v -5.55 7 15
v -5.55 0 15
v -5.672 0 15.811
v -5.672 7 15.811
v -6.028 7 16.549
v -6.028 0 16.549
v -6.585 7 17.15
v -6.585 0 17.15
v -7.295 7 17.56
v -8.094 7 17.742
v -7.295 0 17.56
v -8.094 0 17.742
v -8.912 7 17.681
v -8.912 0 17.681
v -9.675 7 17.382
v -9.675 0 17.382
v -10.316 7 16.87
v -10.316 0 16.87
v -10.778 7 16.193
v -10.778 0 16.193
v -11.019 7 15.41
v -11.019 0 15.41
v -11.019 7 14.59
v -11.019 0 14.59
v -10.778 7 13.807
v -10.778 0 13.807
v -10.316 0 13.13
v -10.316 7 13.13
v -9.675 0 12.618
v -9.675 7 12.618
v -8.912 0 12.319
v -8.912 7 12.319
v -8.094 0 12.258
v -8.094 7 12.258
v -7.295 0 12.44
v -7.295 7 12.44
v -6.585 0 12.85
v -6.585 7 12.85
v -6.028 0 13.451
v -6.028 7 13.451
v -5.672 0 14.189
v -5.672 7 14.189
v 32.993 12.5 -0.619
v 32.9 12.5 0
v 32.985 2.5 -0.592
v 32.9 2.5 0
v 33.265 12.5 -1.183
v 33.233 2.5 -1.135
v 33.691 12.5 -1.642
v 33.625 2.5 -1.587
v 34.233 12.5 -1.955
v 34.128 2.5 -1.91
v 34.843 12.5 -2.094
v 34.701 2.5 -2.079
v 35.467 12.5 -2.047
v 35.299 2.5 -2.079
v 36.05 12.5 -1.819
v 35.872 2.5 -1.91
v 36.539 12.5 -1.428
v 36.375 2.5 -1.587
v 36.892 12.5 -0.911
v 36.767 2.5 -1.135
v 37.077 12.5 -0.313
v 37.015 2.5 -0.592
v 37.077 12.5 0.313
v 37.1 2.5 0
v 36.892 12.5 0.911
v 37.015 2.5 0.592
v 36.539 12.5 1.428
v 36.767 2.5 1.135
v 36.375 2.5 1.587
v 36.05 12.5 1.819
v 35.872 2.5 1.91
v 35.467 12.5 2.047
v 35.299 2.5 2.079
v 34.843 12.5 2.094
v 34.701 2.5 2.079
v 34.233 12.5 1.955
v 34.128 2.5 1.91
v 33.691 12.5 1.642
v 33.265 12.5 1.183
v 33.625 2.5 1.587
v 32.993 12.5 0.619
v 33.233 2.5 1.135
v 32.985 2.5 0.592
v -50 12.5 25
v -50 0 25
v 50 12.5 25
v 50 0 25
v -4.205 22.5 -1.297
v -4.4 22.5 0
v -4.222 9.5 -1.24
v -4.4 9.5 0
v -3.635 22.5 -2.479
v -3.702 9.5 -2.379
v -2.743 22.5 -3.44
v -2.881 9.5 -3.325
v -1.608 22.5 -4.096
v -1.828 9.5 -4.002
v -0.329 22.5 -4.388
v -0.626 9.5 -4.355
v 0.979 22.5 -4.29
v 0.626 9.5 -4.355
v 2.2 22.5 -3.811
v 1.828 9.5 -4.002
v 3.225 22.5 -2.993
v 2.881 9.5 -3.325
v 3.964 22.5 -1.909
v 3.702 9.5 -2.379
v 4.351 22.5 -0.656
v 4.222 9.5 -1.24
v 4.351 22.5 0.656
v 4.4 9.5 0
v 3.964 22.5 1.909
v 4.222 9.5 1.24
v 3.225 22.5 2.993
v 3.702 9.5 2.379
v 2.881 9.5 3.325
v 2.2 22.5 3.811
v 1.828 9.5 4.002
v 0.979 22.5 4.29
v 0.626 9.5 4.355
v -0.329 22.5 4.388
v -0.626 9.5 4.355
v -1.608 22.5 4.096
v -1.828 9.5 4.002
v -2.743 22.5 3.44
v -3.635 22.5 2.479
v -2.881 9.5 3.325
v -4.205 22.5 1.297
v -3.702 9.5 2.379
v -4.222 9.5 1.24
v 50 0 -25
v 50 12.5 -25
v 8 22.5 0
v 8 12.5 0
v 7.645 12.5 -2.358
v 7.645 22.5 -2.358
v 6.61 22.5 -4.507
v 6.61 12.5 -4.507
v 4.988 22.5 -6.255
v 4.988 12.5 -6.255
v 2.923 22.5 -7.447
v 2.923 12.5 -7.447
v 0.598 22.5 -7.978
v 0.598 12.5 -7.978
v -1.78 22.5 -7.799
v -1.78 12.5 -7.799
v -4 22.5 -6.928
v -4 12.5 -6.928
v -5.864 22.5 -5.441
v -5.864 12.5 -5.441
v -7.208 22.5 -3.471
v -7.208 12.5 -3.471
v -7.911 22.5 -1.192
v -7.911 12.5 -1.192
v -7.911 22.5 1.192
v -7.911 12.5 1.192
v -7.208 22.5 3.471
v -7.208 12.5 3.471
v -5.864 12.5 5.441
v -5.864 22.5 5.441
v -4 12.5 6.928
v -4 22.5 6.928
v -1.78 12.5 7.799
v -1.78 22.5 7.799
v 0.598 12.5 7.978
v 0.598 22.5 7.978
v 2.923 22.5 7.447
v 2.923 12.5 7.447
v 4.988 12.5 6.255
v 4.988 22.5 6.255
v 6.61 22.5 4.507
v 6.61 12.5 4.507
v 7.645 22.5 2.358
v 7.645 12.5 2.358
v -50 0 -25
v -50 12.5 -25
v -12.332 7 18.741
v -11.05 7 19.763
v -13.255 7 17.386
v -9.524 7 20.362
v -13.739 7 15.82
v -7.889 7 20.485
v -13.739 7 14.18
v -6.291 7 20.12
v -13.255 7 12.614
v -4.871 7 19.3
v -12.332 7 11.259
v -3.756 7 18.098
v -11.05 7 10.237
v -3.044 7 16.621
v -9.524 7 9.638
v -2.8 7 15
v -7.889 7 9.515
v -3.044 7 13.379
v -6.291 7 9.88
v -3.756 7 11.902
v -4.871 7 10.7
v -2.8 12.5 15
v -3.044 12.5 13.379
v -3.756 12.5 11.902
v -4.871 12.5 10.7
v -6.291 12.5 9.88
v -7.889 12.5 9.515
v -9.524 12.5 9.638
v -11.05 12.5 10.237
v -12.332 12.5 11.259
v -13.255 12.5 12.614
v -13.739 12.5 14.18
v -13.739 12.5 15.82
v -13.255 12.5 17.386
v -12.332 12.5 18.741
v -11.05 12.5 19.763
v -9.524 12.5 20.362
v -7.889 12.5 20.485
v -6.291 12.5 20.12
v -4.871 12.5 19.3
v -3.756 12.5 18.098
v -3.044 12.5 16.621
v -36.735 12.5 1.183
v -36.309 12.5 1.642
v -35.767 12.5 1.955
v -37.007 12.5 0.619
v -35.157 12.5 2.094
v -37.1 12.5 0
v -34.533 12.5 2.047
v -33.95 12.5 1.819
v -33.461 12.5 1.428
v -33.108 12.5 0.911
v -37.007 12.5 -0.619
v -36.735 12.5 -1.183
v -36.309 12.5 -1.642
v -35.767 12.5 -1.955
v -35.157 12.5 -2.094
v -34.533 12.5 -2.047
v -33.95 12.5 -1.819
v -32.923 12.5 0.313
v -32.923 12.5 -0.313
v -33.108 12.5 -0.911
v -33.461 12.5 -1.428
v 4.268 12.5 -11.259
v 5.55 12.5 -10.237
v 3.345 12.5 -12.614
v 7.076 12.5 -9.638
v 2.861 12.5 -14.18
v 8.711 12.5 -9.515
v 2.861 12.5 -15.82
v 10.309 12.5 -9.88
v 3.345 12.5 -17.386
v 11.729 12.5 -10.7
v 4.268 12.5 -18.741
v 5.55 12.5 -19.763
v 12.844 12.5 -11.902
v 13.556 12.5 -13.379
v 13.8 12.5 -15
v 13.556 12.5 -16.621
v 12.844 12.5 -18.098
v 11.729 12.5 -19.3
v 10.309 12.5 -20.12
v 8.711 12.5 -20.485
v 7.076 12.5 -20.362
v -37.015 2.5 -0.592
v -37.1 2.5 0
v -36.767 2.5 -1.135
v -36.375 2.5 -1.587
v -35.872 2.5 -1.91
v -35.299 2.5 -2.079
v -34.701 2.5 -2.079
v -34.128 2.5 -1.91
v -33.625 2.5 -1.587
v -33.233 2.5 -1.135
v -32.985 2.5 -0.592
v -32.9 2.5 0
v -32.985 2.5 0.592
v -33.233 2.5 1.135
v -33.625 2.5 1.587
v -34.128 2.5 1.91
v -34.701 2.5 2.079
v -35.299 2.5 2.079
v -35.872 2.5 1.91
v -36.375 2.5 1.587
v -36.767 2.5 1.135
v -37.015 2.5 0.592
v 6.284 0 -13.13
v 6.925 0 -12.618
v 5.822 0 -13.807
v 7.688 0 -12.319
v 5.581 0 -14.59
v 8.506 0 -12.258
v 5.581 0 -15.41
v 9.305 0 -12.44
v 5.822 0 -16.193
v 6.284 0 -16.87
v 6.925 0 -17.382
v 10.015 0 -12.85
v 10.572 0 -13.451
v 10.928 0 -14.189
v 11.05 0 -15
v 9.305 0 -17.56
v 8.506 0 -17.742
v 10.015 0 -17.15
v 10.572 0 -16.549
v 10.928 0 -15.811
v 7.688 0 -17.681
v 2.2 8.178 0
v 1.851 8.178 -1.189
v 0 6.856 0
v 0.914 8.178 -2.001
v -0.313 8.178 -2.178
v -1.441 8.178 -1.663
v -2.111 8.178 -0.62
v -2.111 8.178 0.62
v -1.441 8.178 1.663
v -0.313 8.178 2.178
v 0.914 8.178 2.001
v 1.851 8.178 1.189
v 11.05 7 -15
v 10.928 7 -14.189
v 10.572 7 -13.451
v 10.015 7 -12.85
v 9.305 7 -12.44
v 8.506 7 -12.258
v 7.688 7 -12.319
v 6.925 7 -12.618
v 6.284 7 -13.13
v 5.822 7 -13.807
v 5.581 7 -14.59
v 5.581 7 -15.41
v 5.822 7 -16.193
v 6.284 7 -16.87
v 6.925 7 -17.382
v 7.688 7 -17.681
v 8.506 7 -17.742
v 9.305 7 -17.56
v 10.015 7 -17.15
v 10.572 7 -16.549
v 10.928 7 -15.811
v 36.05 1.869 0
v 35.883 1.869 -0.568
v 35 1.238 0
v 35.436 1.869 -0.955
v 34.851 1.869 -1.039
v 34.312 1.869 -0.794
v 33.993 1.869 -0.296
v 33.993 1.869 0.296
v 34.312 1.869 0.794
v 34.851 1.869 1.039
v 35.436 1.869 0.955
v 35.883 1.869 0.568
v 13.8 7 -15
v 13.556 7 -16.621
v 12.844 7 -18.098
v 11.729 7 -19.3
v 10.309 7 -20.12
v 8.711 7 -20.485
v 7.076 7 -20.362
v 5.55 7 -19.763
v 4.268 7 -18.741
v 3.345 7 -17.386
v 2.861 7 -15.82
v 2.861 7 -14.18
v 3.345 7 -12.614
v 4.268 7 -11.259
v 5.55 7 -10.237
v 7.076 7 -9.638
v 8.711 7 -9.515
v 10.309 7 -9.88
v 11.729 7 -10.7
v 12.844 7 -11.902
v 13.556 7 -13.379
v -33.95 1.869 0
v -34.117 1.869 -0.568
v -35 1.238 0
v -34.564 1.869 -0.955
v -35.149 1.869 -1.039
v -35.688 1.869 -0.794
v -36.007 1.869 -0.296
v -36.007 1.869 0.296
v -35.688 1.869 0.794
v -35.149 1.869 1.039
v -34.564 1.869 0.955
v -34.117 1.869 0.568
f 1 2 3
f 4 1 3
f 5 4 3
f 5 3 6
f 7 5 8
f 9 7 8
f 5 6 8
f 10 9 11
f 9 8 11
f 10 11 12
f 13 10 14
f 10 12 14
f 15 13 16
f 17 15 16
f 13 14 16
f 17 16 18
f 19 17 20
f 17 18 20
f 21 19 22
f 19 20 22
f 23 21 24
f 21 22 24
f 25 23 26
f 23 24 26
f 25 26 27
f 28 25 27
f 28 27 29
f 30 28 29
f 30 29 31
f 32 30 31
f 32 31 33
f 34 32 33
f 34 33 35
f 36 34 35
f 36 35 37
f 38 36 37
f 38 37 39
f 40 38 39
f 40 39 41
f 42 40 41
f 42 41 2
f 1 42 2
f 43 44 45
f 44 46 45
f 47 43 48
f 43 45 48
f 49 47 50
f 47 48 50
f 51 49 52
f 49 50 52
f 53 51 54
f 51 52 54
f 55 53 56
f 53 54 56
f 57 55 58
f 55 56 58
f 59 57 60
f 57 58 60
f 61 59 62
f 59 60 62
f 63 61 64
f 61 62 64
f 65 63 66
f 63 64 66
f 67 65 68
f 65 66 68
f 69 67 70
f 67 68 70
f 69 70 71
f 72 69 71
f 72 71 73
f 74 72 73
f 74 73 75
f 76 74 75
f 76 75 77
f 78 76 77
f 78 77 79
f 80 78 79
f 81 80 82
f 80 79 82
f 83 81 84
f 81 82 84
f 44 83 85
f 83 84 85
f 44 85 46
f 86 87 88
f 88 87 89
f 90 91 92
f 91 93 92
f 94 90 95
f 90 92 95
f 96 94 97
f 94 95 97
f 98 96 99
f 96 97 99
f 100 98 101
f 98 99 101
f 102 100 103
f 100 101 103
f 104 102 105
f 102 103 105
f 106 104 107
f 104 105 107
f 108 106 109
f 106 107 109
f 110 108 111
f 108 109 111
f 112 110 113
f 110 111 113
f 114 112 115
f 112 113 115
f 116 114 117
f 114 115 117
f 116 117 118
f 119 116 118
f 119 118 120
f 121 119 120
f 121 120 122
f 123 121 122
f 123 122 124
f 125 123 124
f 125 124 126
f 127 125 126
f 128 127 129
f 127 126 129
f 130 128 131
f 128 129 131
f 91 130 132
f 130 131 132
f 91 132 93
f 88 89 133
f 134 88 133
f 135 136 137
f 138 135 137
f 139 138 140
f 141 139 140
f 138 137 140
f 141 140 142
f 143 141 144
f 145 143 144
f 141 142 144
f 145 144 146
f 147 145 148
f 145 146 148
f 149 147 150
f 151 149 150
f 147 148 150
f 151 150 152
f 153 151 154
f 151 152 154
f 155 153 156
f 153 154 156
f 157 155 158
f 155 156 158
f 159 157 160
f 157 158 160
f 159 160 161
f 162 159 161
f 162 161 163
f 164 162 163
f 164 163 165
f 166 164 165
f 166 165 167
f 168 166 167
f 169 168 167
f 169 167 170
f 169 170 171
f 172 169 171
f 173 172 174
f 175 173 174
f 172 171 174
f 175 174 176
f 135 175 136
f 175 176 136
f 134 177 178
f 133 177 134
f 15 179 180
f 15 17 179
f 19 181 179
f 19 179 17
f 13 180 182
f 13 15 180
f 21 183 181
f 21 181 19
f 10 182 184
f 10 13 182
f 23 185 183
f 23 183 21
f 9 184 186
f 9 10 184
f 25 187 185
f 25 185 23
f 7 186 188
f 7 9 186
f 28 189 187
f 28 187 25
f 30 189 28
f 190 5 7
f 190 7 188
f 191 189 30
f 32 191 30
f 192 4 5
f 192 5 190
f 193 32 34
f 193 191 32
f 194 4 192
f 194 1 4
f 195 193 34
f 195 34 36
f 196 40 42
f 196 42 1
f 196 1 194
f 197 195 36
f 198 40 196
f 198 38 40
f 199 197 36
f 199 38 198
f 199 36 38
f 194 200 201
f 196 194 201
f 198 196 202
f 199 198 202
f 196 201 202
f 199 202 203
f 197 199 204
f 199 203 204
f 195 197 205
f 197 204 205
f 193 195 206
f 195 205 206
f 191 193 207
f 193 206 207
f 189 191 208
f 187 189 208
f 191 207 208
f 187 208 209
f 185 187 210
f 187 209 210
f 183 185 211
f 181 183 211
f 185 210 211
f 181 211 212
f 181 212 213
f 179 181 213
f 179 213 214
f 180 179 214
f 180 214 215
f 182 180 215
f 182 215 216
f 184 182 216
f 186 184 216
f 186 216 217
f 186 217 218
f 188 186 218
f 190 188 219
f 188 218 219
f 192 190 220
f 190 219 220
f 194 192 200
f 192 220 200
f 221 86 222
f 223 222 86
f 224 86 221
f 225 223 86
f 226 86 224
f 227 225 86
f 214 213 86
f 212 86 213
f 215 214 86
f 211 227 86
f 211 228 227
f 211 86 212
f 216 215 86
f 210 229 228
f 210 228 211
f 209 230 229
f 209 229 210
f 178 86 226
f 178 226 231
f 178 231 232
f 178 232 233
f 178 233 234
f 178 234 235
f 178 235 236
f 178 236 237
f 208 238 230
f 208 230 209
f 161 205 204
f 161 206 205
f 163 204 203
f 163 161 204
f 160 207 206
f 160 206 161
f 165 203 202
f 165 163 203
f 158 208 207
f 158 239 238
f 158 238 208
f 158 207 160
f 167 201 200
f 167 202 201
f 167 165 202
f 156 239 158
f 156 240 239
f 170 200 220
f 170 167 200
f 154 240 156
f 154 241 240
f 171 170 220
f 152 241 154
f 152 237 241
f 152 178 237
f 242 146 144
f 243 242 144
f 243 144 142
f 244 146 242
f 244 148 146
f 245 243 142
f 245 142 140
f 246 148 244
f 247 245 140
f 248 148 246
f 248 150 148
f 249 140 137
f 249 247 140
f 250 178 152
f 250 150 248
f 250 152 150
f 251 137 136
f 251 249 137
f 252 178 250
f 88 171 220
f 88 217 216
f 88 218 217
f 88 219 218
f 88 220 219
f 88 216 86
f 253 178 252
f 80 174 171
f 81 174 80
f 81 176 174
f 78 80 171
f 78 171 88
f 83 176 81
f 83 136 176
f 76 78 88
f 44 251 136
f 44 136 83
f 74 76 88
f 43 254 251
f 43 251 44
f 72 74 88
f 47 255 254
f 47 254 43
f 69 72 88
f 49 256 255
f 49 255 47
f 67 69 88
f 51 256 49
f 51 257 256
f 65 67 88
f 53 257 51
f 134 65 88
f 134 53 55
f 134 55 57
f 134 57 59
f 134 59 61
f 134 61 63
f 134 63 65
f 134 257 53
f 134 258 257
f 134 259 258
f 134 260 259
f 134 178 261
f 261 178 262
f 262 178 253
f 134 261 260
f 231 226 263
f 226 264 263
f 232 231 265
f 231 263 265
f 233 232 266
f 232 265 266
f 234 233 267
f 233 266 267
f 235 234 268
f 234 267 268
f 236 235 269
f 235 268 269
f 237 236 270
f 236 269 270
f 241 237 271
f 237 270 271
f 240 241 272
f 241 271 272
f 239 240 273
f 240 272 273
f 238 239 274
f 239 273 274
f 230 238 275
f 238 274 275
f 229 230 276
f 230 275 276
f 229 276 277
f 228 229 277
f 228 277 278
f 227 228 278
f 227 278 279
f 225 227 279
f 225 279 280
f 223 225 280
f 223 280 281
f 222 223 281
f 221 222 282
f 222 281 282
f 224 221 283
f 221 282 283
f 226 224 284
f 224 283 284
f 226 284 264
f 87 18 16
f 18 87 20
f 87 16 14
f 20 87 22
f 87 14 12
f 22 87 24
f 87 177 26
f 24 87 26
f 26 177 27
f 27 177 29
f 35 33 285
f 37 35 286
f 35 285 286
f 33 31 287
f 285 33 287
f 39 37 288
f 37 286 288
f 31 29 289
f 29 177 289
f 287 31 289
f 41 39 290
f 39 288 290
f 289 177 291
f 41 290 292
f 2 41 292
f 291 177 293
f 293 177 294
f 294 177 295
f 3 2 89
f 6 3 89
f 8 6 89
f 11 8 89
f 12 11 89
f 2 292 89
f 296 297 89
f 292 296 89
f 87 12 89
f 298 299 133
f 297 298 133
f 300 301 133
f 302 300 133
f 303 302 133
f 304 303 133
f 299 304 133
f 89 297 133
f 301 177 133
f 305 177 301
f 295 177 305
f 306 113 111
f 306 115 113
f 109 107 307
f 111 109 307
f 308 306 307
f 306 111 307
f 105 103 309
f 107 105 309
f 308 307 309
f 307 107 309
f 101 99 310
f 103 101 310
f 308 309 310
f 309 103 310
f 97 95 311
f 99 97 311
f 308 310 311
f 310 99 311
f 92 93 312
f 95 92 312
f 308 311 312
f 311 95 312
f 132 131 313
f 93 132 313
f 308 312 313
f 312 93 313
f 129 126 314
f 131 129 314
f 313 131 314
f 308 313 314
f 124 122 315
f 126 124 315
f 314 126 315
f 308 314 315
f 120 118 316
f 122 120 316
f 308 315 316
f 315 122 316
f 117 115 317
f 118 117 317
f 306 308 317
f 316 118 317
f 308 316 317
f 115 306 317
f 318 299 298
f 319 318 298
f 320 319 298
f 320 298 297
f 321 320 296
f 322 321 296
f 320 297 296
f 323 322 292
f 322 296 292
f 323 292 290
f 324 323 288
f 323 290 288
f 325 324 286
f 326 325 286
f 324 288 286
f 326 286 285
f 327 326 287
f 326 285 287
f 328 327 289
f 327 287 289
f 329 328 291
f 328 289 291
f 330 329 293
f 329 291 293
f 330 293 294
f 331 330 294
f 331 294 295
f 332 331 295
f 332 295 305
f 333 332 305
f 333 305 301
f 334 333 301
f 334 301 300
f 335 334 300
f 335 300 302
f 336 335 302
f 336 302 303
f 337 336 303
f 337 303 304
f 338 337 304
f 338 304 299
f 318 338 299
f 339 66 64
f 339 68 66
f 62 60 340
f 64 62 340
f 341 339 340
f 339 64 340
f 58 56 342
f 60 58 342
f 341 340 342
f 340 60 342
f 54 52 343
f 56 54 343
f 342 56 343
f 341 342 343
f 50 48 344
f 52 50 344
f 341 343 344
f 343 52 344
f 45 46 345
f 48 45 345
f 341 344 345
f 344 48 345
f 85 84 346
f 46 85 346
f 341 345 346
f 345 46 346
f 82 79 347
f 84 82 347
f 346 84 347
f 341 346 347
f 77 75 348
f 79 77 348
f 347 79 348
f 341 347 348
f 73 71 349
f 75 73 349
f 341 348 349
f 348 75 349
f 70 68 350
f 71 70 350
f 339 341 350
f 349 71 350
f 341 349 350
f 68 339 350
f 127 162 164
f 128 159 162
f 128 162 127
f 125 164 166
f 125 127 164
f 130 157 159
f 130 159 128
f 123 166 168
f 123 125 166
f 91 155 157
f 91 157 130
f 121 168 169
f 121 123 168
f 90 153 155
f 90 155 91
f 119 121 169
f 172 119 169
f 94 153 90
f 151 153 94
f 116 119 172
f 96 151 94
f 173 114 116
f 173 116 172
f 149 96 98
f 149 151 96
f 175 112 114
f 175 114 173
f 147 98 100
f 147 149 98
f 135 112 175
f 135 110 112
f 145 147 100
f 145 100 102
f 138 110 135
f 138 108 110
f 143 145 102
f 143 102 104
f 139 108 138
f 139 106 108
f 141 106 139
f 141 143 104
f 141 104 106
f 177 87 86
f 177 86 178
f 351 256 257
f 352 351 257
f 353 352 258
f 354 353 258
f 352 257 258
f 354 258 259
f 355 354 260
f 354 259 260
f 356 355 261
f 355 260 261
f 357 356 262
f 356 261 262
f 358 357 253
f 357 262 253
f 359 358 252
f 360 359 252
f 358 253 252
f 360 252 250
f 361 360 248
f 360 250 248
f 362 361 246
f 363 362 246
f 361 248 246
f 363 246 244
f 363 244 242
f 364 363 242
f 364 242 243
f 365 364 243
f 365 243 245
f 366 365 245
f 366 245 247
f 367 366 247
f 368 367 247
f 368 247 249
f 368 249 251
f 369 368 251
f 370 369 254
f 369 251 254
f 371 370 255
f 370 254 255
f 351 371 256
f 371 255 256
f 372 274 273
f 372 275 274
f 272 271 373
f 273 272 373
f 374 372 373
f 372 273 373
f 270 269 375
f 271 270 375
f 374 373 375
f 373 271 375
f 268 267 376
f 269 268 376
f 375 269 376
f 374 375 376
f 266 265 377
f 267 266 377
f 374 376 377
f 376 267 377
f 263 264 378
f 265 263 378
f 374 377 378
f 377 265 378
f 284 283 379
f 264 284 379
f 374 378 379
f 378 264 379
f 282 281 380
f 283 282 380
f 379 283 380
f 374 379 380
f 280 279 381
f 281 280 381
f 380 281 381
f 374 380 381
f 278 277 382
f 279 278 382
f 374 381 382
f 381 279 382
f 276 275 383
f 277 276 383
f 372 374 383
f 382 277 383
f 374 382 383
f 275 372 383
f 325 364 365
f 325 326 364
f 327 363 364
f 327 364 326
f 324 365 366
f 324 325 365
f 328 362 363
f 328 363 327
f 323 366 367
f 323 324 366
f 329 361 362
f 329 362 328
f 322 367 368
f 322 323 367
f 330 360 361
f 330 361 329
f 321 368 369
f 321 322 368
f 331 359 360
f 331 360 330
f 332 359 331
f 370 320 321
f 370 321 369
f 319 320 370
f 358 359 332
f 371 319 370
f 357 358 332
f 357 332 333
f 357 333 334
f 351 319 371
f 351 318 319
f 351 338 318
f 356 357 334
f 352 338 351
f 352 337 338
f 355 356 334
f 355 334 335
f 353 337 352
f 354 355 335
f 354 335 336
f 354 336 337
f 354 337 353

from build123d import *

# Parameters (mm, degrees)
SKETCH1_W                   = 100
SKETCH1_H                   = 50
BOSS_EXTRUDE1_DEPTH         = 12.5
SKETCH2_R                   = 8
BOSS_EXTRUDE2_DEPTH         = 10
M10X1_25_TAPPED_HOLE1_D     = 8.8
M10X1_25_TAPPED_HOLE1_DEPTH = 13
M10X1_25_TAPPED_HOLE1_TIP   = 2.643786724
M5_TAPPED_HOLE1_D           = 4.2
M5_TAPPED_HOLE1_DEPTH       = 10
M5_TAPPED_HOLE1_TIP         = 1.2618073
SKETCH8_R                   = 2.75
CUT_EXTRUDE1_DEPTH          = 23.5
SKETCH10_R                  = 5.5
CUT_EXTRUDE2_DEPTH          = 5.5


with BuildPart() as part:
    # Sketch1 → Boss-Extrude1 (new body)
    with BuildSketch(Plane(origin=(0, 0, 0), x_dir=(1, 0, 0), z_dir=(0, 1, 0))):
        Rectangle(SKETCH1_W, SKETCH1_H)
    extrude(amount=BOSS_EXTRUDE1_DEPTH)

    # Sketch2 → Boss-Extrude2 (add)
    with BuildSketch(Plane(origin=(0, 12.5, 0), x_dir=(1, 0, 0), z_dir=(0, 1, 0))):
        Circle(SKETCH2_R)
    extrude(amount=BOSS_EXTRUDE2_DEPTH)

    # M10x1.25 Tapped Hole1
    with Locations(Plane(origin=(0, 22.5, 0), x_dir=(1, 0, 0), z_dir=(0, 1, 0))):
        with Locations((0, 0)):
            Hole(M10X1_25_TAPPED_HOLE1_D / 2, depth=M10X1_25_TAPPED_HOLE1_DEPTH)
            with Locations((0, 0, -(M10X1_25_TAPPED_HOLE1_DEPTH + M10X1_25_TAPPED_HOLE1_TIP / 2))):  # 118° drill point
                Cone(0, M10X1_25_TAPPED_HOLE1_D / 2, M10X1_25_TAPPED_HOLE1_TIP, mode=Mode.SUBTRACT)

    # M5 Tapped Hole1
    with Locations(Plane(origin=(0, 12.5, 0), x_dir=(1, 0, 0), z_dir=(0, 1, 0))):
        with Locations((-35, 0), (35, 0)):
            Hole(M5_TAPPED_HOLE1_D / 2, depth=M5_TAPPED_HOLE1_DEPTH)
            with Locations((0, 0, -(M5_TAPPED_HOLE1_DEPTH + M5_TAPPED_HOLE1_TIP / 2))):  # 118° drill point
                Cone(0, M5_TAPPED_HOLE1_D / 2, M5_TAPPED_HOLE1_TIP, mode=Mode.SUBTRACT)

    # Sketch8 → Cut-Extrude1 (cut, through all)
    with BuildSketch(Plane.XZ):
        with Locations((8.3, -15)):
            Circle(SKETCH8_R)
        with Locations((-8.3, 15)):
            Circle(SKETCH8_R)
    extrude(amount=-CUT_EXTRUDE1_DEPTH, mode=Mode.SUBTRACT)

    # Sketch10 → Cut-Extrude2 (cut)
    with BuildSketch(Plane(origin=(0, 12.5, 0), x_dir=(1, 0, 0), z_dir=(0, 1, 0))):
        with Locations((8.3, 15)):
            Circle(SKETCH10_R)
        with Locations((-8.3, -15)):
            Circle(SKETCH10_R)
    extrude(amount=-CUT_EXTRUDE2_DEPTH, mode=Mode.SUBTRACT)


solid = part.part
